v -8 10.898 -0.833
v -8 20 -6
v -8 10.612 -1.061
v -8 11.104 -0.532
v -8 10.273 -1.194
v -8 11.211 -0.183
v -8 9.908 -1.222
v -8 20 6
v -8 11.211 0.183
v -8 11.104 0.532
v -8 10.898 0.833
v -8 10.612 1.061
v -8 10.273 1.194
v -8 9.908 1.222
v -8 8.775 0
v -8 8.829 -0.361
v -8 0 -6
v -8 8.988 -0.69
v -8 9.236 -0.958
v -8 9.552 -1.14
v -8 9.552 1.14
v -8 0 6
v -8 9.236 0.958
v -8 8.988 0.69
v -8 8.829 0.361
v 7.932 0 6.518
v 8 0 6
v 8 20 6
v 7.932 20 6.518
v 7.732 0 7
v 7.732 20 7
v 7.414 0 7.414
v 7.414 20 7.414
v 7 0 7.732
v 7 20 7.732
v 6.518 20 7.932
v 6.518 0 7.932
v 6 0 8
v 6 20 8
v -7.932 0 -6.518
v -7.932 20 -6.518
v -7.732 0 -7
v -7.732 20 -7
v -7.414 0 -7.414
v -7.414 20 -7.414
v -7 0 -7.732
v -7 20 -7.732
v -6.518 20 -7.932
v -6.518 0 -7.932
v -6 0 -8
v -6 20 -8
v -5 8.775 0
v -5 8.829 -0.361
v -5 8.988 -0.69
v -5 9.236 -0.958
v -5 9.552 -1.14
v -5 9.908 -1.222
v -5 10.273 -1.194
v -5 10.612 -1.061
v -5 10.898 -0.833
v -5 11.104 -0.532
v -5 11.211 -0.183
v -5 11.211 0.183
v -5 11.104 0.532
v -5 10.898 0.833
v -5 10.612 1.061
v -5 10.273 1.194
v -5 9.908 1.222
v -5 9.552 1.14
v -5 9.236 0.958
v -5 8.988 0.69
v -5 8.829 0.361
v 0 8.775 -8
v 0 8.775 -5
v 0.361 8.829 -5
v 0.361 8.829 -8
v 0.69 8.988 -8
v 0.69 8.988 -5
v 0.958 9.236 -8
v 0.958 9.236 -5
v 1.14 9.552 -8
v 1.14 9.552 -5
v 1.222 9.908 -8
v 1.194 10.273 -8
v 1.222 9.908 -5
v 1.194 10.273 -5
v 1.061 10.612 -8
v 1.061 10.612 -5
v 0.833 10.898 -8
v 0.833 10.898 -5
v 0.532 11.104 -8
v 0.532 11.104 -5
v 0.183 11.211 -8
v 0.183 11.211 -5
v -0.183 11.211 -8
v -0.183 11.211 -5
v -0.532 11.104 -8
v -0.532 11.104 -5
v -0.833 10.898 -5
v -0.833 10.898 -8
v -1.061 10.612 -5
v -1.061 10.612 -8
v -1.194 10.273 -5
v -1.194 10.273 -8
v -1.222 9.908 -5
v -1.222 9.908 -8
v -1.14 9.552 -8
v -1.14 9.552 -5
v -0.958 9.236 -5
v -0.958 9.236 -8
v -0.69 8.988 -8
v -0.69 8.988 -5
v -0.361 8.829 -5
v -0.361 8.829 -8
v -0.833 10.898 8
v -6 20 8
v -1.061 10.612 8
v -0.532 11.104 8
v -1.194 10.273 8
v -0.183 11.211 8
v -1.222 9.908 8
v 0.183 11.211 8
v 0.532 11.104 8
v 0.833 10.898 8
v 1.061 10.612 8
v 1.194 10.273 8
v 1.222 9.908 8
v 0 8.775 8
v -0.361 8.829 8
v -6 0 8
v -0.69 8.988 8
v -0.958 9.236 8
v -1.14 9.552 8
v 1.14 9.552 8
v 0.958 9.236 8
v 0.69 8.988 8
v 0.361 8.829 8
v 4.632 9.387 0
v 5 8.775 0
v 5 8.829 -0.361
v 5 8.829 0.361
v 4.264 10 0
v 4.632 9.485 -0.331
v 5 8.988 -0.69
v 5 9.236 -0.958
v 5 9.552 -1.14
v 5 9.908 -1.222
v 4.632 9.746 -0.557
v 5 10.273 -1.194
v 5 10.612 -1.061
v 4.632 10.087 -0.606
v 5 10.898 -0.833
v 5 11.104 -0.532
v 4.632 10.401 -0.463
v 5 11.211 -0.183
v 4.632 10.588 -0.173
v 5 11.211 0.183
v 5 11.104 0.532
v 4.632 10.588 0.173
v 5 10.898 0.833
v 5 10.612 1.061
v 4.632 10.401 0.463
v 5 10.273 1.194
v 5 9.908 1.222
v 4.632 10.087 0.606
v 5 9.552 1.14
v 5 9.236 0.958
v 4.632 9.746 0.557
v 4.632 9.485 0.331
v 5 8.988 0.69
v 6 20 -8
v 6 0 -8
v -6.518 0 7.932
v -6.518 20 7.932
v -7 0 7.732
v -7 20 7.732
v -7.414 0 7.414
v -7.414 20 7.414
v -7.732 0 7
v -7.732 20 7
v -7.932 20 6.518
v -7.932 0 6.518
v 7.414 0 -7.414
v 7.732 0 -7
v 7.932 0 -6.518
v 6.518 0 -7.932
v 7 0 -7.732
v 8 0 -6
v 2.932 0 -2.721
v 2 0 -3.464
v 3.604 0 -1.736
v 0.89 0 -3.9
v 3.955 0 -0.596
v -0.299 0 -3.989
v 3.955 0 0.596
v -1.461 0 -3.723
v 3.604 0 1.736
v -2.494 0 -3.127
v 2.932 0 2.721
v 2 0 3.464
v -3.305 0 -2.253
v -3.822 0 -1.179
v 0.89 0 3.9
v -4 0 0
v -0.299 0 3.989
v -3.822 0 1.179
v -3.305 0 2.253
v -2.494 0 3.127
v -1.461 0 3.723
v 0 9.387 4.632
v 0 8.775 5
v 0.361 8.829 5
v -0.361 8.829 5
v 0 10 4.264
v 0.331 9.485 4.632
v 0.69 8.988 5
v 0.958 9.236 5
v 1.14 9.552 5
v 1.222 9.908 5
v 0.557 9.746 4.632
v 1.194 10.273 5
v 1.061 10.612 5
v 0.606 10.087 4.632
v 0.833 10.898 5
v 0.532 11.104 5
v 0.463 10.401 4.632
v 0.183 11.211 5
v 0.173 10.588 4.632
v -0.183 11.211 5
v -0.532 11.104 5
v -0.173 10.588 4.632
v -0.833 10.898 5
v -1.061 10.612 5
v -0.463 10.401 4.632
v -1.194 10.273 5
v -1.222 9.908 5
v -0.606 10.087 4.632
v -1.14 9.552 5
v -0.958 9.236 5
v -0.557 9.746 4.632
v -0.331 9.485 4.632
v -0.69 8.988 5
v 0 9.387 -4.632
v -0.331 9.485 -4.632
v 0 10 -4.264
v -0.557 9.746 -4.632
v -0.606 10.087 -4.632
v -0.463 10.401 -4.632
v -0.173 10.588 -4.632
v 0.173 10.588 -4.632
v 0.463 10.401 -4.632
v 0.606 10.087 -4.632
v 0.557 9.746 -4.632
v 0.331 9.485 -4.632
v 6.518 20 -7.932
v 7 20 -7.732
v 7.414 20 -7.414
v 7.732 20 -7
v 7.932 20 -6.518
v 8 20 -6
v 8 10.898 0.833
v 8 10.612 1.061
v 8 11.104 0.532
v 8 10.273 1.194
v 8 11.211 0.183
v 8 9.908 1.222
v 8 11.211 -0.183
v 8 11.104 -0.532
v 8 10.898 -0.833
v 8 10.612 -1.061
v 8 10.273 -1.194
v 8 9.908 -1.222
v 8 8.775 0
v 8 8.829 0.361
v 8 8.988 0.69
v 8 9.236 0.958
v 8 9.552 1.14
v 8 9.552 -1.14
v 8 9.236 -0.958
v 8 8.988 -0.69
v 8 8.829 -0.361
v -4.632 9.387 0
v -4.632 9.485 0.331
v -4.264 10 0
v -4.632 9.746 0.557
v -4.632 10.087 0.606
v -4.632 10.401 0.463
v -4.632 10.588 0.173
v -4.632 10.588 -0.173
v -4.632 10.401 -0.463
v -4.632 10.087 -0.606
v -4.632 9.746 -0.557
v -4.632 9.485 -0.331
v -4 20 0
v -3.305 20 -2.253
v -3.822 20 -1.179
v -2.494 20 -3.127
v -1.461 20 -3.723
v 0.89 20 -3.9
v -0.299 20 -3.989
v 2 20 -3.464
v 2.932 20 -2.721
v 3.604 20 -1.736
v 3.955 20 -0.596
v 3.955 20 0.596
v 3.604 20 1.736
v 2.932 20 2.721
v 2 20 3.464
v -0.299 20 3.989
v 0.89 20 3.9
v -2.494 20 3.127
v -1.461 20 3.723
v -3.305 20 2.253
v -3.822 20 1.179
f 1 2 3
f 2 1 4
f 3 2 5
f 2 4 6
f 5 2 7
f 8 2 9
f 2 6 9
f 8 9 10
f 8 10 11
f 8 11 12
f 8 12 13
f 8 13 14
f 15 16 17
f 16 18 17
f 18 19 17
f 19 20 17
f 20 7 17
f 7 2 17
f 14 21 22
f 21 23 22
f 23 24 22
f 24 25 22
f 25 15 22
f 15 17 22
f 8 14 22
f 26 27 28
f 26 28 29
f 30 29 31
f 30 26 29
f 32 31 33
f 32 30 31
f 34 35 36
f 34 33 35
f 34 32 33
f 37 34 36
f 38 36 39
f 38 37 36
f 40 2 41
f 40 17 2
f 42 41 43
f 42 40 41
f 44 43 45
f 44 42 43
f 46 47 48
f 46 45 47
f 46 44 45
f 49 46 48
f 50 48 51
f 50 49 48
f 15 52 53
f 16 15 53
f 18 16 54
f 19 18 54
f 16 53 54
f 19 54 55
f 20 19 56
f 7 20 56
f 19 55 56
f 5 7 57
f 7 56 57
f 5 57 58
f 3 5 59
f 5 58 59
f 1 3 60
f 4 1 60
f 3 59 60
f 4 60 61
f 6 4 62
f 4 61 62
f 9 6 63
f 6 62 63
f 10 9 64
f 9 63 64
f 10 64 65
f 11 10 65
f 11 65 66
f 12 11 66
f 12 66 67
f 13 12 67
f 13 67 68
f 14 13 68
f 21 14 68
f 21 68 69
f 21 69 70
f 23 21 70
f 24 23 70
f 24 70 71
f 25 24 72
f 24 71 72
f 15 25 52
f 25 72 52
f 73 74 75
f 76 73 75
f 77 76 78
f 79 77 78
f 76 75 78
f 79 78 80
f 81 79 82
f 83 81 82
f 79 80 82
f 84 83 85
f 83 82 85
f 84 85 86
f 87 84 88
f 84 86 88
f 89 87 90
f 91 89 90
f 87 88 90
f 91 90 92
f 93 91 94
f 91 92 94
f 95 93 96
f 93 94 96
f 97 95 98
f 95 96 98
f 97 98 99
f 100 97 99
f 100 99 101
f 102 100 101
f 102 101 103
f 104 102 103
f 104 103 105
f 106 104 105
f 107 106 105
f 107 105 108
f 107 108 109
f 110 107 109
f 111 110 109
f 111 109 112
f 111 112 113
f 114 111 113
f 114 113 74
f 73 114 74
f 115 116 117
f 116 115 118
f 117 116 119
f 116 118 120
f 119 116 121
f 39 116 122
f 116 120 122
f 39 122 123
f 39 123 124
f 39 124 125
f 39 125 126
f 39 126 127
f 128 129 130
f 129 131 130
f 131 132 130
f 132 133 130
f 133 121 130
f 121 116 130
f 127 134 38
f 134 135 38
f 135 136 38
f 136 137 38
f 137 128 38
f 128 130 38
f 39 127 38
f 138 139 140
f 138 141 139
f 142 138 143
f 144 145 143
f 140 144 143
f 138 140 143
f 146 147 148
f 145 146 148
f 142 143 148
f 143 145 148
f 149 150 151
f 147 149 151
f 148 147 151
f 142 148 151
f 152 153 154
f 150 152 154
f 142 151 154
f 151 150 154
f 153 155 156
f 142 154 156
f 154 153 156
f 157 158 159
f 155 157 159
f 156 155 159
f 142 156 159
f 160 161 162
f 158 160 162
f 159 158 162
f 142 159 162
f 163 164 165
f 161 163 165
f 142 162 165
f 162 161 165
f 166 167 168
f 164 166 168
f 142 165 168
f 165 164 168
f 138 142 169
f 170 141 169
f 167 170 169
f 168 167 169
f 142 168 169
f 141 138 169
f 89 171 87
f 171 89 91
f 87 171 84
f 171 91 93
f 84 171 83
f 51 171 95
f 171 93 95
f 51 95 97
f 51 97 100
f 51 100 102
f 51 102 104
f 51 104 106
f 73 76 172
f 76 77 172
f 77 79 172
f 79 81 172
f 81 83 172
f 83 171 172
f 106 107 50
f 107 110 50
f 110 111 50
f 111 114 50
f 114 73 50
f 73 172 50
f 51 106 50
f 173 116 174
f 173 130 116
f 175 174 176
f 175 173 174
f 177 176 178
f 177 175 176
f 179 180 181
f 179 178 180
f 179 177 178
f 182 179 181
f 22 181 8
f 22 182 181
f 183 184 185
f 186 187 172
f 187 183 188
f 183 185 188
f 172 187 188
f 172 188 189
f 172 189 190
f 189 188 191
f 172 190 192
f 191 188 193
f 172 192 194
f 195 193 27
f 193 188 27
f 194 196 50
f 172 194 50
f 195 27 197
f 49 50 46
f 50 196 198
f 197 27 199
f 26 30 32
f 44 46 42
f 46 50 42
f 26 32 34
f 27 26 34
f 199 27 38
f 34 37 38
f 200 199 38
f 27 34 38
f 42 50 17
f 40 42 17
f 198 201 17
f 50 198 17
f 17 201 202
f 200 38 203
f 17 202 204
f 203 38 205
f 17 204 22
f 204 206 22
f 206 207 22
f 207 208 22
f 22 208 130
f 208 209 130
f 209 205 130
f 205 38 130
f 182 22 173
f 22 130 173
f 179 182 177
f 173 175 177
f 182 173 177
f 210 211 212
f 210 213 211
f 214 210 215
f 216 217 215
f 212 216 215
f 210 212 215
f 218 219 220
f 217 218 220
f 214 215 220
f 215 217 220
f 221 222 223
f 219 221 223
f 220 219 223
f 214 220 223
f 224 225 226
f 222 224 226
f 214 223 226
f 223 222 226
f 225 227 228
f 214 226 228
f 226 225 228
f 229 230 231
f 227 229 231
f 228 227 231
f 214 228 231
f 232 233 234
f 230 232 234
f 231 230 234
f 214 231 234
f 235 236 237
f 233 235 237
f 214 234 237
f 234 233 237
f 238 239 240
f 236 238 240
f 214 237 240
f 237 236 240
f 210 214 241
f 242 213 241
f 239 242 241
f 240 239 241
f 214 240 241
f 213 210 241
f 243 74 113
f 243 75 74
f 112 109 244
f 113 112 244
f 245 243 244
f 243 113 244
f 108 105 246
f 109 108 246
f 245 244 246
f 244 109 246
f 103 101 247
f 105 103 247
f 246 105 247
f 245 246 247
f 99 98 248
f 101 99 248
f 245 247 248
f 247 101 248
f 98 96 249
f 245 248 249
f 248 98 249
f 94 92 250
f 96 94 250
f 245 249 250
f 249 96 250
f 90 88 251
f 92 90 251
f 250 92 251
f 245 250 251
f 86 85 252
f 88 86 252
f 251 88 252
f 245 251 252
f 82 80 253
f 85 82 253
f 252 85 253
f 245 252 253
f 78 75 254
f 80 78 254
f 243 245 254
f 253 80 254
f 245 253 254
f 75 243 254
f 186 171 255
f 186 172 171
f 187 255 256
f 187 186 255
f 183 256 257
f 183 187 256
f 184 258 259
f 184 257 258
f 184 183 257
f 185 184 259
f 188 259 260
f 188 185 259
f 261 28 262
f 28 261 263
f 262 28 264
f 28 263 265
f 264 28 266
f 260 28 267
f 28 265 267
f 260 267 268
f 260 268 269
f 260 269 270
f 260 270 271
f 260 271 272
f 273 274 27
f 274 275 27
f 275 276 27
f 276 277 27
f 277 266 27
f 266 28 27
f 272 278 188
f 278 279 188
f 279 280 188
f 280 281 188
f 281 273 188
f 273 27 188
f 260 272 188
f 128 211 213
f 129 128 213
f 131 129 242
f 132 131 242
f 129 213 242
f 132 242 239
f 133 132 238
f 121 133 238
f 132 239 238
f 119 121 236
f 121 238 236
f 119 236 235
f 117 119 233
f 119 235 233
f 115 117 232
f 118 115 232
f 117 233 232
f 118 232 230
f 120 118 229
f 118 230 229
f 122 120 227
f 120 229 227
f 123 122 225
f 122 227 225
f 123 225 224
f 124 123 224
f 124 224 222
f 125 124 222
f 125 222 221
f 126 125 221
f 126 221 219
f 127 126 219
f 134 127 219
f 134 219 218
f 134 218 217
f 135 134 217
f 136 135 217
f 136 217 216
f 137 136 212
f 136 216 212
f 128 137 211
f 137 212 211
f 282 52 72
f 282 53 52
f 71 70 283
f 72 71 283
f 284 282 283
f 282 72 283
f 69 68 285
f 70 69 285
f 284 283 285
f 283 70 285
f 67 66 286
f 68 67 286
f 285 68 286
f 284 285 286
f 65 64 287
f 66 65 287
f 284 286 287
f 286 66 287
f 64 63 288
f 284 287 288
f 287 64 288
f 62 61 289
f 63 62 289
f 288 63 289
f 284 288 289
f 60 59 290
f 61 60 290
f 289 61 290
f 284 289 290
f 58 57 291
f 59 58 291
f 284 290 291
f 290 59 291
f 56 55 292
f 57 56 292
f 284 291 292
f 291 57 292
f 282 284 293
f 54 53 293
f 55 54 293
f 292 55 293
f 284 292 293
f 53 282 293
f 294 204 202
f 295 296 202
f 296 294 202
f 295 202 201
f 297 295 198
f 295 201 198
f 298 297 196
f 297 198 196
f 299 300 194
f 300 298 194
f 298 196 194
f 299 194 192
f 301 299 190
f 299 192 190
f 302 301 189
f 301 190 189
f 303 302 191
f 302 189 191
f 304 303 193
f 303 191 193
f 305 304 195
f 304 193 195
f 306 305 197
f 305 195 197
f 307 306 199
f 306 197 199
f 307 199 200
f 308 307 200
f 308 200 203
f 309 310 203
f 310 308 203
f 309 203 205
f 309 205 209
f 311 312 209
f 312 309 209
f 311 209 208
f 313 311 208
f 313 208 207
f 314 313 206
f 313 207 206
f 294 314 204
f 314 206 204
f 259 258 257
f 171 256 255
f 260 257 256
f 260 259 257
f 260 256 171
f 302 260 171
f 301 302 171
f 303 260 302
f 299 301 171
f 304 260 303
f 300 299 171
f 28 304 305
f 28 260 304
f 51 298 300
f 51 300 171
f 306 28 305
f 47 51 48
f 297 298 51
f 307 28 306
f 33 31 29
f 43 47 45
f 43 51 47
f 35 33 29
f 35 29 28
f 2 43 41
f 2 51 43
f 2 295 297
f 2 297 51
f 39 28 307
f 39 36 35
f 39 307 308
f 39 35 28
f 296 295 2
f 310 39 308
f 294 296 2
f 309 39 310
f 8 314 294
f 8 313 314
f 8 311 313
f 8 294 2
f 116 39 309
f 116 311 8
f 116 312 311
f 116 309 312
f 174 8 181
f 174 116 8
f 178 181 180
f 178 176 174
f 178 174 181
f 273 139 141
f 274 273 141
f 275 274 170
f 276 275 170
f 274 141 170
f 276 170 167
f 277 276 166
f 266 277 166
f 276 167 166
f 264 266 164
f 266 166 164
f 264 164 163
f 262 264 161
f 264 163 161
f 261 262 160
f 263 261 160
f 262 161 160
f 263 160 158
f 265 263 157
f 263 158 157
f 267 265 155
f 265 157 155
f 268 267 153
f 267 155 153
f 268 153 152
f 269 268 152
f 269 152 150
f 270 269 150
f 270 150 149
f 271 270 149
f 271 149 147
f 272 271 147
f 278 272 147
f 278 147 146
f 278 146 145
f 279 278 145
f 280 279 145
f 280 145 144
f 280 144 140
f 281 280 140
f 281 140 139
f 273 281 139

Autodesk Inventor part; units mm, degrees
ref_plane "YZ Plane" through (0, 0, 0) normal (1, 0, 0) x (0, 1, 0)
ref_plane "XZ Plane" through (0, 0, 0) normal (0, 1, 0) x (-1, 0, 0)
ref_plane "XY Plane" through (0, 0, 0) normal (0, 0, 1) x (1, 0, 0)
sketch "Sketch1" plane through (0, 0, 0) normal (0, 1, 0) x (-1, 0, 0)
  circle A0 centre (0, 0) radius 4
  line L0 (6, 8) -> (-6, 8)
  line L1 (-8, 6) -> (-8, -6)
  line L2 (-6, -8) -> (6, -8)
  line L3 (8, -6) -> (8, 6)
  line L4 (8, 8) -> (-8, -8) construction
  line L5 (-8, 8) -> (8, -8) construction
  arc A1 (8, 6) -> (6, 8) centre (6, 6) ccw
  arc A2 (6, -8) -> (8, -6) centre (6, -6) ccw
  arc A3 (-8, -6) -> (-6, -8) centre (-6, -6) ccw
  arc A4 (-6, 8) -> (-8, 6) centre (-6, 6) ccw
  dimension "d0" = 8
  dimension "d1" = 16
  dimension "d2" = 16
  dimension "d5" = 2
extrude "Extrusion1" add sketch "Sketch1" along normal blind 20
sketch "Sketch2" plane through (-6, 0, 8) normal (0, 0, 1) x (1, 0, 0)
  line L0 (0, 0) -> (12, 0) projected
  line L1 (12, 0) -> (12, 20) projected
  line L2 (0, 20) -> (12, 20) projected
  line L3 (0, 0) -> (0, 20) projected
  point P0 (6, 0)
  point P1 (6, 10)
  dimension "d6" = 6
hole "Hole1" at (0, 10, 8) direction (0, 0, -1) diameter 2.45 depth 3 tip angle 118
pattern_circular "Circular Pattern1" count 4 over 360 about axis through (0, -10, 0) along (0, 1, 0) of "Hole1"
thread "Thread1" size "M8x1.25" class "6H" standard "ANSI Metric M Profile" full length
properties part number "leadscrew"
